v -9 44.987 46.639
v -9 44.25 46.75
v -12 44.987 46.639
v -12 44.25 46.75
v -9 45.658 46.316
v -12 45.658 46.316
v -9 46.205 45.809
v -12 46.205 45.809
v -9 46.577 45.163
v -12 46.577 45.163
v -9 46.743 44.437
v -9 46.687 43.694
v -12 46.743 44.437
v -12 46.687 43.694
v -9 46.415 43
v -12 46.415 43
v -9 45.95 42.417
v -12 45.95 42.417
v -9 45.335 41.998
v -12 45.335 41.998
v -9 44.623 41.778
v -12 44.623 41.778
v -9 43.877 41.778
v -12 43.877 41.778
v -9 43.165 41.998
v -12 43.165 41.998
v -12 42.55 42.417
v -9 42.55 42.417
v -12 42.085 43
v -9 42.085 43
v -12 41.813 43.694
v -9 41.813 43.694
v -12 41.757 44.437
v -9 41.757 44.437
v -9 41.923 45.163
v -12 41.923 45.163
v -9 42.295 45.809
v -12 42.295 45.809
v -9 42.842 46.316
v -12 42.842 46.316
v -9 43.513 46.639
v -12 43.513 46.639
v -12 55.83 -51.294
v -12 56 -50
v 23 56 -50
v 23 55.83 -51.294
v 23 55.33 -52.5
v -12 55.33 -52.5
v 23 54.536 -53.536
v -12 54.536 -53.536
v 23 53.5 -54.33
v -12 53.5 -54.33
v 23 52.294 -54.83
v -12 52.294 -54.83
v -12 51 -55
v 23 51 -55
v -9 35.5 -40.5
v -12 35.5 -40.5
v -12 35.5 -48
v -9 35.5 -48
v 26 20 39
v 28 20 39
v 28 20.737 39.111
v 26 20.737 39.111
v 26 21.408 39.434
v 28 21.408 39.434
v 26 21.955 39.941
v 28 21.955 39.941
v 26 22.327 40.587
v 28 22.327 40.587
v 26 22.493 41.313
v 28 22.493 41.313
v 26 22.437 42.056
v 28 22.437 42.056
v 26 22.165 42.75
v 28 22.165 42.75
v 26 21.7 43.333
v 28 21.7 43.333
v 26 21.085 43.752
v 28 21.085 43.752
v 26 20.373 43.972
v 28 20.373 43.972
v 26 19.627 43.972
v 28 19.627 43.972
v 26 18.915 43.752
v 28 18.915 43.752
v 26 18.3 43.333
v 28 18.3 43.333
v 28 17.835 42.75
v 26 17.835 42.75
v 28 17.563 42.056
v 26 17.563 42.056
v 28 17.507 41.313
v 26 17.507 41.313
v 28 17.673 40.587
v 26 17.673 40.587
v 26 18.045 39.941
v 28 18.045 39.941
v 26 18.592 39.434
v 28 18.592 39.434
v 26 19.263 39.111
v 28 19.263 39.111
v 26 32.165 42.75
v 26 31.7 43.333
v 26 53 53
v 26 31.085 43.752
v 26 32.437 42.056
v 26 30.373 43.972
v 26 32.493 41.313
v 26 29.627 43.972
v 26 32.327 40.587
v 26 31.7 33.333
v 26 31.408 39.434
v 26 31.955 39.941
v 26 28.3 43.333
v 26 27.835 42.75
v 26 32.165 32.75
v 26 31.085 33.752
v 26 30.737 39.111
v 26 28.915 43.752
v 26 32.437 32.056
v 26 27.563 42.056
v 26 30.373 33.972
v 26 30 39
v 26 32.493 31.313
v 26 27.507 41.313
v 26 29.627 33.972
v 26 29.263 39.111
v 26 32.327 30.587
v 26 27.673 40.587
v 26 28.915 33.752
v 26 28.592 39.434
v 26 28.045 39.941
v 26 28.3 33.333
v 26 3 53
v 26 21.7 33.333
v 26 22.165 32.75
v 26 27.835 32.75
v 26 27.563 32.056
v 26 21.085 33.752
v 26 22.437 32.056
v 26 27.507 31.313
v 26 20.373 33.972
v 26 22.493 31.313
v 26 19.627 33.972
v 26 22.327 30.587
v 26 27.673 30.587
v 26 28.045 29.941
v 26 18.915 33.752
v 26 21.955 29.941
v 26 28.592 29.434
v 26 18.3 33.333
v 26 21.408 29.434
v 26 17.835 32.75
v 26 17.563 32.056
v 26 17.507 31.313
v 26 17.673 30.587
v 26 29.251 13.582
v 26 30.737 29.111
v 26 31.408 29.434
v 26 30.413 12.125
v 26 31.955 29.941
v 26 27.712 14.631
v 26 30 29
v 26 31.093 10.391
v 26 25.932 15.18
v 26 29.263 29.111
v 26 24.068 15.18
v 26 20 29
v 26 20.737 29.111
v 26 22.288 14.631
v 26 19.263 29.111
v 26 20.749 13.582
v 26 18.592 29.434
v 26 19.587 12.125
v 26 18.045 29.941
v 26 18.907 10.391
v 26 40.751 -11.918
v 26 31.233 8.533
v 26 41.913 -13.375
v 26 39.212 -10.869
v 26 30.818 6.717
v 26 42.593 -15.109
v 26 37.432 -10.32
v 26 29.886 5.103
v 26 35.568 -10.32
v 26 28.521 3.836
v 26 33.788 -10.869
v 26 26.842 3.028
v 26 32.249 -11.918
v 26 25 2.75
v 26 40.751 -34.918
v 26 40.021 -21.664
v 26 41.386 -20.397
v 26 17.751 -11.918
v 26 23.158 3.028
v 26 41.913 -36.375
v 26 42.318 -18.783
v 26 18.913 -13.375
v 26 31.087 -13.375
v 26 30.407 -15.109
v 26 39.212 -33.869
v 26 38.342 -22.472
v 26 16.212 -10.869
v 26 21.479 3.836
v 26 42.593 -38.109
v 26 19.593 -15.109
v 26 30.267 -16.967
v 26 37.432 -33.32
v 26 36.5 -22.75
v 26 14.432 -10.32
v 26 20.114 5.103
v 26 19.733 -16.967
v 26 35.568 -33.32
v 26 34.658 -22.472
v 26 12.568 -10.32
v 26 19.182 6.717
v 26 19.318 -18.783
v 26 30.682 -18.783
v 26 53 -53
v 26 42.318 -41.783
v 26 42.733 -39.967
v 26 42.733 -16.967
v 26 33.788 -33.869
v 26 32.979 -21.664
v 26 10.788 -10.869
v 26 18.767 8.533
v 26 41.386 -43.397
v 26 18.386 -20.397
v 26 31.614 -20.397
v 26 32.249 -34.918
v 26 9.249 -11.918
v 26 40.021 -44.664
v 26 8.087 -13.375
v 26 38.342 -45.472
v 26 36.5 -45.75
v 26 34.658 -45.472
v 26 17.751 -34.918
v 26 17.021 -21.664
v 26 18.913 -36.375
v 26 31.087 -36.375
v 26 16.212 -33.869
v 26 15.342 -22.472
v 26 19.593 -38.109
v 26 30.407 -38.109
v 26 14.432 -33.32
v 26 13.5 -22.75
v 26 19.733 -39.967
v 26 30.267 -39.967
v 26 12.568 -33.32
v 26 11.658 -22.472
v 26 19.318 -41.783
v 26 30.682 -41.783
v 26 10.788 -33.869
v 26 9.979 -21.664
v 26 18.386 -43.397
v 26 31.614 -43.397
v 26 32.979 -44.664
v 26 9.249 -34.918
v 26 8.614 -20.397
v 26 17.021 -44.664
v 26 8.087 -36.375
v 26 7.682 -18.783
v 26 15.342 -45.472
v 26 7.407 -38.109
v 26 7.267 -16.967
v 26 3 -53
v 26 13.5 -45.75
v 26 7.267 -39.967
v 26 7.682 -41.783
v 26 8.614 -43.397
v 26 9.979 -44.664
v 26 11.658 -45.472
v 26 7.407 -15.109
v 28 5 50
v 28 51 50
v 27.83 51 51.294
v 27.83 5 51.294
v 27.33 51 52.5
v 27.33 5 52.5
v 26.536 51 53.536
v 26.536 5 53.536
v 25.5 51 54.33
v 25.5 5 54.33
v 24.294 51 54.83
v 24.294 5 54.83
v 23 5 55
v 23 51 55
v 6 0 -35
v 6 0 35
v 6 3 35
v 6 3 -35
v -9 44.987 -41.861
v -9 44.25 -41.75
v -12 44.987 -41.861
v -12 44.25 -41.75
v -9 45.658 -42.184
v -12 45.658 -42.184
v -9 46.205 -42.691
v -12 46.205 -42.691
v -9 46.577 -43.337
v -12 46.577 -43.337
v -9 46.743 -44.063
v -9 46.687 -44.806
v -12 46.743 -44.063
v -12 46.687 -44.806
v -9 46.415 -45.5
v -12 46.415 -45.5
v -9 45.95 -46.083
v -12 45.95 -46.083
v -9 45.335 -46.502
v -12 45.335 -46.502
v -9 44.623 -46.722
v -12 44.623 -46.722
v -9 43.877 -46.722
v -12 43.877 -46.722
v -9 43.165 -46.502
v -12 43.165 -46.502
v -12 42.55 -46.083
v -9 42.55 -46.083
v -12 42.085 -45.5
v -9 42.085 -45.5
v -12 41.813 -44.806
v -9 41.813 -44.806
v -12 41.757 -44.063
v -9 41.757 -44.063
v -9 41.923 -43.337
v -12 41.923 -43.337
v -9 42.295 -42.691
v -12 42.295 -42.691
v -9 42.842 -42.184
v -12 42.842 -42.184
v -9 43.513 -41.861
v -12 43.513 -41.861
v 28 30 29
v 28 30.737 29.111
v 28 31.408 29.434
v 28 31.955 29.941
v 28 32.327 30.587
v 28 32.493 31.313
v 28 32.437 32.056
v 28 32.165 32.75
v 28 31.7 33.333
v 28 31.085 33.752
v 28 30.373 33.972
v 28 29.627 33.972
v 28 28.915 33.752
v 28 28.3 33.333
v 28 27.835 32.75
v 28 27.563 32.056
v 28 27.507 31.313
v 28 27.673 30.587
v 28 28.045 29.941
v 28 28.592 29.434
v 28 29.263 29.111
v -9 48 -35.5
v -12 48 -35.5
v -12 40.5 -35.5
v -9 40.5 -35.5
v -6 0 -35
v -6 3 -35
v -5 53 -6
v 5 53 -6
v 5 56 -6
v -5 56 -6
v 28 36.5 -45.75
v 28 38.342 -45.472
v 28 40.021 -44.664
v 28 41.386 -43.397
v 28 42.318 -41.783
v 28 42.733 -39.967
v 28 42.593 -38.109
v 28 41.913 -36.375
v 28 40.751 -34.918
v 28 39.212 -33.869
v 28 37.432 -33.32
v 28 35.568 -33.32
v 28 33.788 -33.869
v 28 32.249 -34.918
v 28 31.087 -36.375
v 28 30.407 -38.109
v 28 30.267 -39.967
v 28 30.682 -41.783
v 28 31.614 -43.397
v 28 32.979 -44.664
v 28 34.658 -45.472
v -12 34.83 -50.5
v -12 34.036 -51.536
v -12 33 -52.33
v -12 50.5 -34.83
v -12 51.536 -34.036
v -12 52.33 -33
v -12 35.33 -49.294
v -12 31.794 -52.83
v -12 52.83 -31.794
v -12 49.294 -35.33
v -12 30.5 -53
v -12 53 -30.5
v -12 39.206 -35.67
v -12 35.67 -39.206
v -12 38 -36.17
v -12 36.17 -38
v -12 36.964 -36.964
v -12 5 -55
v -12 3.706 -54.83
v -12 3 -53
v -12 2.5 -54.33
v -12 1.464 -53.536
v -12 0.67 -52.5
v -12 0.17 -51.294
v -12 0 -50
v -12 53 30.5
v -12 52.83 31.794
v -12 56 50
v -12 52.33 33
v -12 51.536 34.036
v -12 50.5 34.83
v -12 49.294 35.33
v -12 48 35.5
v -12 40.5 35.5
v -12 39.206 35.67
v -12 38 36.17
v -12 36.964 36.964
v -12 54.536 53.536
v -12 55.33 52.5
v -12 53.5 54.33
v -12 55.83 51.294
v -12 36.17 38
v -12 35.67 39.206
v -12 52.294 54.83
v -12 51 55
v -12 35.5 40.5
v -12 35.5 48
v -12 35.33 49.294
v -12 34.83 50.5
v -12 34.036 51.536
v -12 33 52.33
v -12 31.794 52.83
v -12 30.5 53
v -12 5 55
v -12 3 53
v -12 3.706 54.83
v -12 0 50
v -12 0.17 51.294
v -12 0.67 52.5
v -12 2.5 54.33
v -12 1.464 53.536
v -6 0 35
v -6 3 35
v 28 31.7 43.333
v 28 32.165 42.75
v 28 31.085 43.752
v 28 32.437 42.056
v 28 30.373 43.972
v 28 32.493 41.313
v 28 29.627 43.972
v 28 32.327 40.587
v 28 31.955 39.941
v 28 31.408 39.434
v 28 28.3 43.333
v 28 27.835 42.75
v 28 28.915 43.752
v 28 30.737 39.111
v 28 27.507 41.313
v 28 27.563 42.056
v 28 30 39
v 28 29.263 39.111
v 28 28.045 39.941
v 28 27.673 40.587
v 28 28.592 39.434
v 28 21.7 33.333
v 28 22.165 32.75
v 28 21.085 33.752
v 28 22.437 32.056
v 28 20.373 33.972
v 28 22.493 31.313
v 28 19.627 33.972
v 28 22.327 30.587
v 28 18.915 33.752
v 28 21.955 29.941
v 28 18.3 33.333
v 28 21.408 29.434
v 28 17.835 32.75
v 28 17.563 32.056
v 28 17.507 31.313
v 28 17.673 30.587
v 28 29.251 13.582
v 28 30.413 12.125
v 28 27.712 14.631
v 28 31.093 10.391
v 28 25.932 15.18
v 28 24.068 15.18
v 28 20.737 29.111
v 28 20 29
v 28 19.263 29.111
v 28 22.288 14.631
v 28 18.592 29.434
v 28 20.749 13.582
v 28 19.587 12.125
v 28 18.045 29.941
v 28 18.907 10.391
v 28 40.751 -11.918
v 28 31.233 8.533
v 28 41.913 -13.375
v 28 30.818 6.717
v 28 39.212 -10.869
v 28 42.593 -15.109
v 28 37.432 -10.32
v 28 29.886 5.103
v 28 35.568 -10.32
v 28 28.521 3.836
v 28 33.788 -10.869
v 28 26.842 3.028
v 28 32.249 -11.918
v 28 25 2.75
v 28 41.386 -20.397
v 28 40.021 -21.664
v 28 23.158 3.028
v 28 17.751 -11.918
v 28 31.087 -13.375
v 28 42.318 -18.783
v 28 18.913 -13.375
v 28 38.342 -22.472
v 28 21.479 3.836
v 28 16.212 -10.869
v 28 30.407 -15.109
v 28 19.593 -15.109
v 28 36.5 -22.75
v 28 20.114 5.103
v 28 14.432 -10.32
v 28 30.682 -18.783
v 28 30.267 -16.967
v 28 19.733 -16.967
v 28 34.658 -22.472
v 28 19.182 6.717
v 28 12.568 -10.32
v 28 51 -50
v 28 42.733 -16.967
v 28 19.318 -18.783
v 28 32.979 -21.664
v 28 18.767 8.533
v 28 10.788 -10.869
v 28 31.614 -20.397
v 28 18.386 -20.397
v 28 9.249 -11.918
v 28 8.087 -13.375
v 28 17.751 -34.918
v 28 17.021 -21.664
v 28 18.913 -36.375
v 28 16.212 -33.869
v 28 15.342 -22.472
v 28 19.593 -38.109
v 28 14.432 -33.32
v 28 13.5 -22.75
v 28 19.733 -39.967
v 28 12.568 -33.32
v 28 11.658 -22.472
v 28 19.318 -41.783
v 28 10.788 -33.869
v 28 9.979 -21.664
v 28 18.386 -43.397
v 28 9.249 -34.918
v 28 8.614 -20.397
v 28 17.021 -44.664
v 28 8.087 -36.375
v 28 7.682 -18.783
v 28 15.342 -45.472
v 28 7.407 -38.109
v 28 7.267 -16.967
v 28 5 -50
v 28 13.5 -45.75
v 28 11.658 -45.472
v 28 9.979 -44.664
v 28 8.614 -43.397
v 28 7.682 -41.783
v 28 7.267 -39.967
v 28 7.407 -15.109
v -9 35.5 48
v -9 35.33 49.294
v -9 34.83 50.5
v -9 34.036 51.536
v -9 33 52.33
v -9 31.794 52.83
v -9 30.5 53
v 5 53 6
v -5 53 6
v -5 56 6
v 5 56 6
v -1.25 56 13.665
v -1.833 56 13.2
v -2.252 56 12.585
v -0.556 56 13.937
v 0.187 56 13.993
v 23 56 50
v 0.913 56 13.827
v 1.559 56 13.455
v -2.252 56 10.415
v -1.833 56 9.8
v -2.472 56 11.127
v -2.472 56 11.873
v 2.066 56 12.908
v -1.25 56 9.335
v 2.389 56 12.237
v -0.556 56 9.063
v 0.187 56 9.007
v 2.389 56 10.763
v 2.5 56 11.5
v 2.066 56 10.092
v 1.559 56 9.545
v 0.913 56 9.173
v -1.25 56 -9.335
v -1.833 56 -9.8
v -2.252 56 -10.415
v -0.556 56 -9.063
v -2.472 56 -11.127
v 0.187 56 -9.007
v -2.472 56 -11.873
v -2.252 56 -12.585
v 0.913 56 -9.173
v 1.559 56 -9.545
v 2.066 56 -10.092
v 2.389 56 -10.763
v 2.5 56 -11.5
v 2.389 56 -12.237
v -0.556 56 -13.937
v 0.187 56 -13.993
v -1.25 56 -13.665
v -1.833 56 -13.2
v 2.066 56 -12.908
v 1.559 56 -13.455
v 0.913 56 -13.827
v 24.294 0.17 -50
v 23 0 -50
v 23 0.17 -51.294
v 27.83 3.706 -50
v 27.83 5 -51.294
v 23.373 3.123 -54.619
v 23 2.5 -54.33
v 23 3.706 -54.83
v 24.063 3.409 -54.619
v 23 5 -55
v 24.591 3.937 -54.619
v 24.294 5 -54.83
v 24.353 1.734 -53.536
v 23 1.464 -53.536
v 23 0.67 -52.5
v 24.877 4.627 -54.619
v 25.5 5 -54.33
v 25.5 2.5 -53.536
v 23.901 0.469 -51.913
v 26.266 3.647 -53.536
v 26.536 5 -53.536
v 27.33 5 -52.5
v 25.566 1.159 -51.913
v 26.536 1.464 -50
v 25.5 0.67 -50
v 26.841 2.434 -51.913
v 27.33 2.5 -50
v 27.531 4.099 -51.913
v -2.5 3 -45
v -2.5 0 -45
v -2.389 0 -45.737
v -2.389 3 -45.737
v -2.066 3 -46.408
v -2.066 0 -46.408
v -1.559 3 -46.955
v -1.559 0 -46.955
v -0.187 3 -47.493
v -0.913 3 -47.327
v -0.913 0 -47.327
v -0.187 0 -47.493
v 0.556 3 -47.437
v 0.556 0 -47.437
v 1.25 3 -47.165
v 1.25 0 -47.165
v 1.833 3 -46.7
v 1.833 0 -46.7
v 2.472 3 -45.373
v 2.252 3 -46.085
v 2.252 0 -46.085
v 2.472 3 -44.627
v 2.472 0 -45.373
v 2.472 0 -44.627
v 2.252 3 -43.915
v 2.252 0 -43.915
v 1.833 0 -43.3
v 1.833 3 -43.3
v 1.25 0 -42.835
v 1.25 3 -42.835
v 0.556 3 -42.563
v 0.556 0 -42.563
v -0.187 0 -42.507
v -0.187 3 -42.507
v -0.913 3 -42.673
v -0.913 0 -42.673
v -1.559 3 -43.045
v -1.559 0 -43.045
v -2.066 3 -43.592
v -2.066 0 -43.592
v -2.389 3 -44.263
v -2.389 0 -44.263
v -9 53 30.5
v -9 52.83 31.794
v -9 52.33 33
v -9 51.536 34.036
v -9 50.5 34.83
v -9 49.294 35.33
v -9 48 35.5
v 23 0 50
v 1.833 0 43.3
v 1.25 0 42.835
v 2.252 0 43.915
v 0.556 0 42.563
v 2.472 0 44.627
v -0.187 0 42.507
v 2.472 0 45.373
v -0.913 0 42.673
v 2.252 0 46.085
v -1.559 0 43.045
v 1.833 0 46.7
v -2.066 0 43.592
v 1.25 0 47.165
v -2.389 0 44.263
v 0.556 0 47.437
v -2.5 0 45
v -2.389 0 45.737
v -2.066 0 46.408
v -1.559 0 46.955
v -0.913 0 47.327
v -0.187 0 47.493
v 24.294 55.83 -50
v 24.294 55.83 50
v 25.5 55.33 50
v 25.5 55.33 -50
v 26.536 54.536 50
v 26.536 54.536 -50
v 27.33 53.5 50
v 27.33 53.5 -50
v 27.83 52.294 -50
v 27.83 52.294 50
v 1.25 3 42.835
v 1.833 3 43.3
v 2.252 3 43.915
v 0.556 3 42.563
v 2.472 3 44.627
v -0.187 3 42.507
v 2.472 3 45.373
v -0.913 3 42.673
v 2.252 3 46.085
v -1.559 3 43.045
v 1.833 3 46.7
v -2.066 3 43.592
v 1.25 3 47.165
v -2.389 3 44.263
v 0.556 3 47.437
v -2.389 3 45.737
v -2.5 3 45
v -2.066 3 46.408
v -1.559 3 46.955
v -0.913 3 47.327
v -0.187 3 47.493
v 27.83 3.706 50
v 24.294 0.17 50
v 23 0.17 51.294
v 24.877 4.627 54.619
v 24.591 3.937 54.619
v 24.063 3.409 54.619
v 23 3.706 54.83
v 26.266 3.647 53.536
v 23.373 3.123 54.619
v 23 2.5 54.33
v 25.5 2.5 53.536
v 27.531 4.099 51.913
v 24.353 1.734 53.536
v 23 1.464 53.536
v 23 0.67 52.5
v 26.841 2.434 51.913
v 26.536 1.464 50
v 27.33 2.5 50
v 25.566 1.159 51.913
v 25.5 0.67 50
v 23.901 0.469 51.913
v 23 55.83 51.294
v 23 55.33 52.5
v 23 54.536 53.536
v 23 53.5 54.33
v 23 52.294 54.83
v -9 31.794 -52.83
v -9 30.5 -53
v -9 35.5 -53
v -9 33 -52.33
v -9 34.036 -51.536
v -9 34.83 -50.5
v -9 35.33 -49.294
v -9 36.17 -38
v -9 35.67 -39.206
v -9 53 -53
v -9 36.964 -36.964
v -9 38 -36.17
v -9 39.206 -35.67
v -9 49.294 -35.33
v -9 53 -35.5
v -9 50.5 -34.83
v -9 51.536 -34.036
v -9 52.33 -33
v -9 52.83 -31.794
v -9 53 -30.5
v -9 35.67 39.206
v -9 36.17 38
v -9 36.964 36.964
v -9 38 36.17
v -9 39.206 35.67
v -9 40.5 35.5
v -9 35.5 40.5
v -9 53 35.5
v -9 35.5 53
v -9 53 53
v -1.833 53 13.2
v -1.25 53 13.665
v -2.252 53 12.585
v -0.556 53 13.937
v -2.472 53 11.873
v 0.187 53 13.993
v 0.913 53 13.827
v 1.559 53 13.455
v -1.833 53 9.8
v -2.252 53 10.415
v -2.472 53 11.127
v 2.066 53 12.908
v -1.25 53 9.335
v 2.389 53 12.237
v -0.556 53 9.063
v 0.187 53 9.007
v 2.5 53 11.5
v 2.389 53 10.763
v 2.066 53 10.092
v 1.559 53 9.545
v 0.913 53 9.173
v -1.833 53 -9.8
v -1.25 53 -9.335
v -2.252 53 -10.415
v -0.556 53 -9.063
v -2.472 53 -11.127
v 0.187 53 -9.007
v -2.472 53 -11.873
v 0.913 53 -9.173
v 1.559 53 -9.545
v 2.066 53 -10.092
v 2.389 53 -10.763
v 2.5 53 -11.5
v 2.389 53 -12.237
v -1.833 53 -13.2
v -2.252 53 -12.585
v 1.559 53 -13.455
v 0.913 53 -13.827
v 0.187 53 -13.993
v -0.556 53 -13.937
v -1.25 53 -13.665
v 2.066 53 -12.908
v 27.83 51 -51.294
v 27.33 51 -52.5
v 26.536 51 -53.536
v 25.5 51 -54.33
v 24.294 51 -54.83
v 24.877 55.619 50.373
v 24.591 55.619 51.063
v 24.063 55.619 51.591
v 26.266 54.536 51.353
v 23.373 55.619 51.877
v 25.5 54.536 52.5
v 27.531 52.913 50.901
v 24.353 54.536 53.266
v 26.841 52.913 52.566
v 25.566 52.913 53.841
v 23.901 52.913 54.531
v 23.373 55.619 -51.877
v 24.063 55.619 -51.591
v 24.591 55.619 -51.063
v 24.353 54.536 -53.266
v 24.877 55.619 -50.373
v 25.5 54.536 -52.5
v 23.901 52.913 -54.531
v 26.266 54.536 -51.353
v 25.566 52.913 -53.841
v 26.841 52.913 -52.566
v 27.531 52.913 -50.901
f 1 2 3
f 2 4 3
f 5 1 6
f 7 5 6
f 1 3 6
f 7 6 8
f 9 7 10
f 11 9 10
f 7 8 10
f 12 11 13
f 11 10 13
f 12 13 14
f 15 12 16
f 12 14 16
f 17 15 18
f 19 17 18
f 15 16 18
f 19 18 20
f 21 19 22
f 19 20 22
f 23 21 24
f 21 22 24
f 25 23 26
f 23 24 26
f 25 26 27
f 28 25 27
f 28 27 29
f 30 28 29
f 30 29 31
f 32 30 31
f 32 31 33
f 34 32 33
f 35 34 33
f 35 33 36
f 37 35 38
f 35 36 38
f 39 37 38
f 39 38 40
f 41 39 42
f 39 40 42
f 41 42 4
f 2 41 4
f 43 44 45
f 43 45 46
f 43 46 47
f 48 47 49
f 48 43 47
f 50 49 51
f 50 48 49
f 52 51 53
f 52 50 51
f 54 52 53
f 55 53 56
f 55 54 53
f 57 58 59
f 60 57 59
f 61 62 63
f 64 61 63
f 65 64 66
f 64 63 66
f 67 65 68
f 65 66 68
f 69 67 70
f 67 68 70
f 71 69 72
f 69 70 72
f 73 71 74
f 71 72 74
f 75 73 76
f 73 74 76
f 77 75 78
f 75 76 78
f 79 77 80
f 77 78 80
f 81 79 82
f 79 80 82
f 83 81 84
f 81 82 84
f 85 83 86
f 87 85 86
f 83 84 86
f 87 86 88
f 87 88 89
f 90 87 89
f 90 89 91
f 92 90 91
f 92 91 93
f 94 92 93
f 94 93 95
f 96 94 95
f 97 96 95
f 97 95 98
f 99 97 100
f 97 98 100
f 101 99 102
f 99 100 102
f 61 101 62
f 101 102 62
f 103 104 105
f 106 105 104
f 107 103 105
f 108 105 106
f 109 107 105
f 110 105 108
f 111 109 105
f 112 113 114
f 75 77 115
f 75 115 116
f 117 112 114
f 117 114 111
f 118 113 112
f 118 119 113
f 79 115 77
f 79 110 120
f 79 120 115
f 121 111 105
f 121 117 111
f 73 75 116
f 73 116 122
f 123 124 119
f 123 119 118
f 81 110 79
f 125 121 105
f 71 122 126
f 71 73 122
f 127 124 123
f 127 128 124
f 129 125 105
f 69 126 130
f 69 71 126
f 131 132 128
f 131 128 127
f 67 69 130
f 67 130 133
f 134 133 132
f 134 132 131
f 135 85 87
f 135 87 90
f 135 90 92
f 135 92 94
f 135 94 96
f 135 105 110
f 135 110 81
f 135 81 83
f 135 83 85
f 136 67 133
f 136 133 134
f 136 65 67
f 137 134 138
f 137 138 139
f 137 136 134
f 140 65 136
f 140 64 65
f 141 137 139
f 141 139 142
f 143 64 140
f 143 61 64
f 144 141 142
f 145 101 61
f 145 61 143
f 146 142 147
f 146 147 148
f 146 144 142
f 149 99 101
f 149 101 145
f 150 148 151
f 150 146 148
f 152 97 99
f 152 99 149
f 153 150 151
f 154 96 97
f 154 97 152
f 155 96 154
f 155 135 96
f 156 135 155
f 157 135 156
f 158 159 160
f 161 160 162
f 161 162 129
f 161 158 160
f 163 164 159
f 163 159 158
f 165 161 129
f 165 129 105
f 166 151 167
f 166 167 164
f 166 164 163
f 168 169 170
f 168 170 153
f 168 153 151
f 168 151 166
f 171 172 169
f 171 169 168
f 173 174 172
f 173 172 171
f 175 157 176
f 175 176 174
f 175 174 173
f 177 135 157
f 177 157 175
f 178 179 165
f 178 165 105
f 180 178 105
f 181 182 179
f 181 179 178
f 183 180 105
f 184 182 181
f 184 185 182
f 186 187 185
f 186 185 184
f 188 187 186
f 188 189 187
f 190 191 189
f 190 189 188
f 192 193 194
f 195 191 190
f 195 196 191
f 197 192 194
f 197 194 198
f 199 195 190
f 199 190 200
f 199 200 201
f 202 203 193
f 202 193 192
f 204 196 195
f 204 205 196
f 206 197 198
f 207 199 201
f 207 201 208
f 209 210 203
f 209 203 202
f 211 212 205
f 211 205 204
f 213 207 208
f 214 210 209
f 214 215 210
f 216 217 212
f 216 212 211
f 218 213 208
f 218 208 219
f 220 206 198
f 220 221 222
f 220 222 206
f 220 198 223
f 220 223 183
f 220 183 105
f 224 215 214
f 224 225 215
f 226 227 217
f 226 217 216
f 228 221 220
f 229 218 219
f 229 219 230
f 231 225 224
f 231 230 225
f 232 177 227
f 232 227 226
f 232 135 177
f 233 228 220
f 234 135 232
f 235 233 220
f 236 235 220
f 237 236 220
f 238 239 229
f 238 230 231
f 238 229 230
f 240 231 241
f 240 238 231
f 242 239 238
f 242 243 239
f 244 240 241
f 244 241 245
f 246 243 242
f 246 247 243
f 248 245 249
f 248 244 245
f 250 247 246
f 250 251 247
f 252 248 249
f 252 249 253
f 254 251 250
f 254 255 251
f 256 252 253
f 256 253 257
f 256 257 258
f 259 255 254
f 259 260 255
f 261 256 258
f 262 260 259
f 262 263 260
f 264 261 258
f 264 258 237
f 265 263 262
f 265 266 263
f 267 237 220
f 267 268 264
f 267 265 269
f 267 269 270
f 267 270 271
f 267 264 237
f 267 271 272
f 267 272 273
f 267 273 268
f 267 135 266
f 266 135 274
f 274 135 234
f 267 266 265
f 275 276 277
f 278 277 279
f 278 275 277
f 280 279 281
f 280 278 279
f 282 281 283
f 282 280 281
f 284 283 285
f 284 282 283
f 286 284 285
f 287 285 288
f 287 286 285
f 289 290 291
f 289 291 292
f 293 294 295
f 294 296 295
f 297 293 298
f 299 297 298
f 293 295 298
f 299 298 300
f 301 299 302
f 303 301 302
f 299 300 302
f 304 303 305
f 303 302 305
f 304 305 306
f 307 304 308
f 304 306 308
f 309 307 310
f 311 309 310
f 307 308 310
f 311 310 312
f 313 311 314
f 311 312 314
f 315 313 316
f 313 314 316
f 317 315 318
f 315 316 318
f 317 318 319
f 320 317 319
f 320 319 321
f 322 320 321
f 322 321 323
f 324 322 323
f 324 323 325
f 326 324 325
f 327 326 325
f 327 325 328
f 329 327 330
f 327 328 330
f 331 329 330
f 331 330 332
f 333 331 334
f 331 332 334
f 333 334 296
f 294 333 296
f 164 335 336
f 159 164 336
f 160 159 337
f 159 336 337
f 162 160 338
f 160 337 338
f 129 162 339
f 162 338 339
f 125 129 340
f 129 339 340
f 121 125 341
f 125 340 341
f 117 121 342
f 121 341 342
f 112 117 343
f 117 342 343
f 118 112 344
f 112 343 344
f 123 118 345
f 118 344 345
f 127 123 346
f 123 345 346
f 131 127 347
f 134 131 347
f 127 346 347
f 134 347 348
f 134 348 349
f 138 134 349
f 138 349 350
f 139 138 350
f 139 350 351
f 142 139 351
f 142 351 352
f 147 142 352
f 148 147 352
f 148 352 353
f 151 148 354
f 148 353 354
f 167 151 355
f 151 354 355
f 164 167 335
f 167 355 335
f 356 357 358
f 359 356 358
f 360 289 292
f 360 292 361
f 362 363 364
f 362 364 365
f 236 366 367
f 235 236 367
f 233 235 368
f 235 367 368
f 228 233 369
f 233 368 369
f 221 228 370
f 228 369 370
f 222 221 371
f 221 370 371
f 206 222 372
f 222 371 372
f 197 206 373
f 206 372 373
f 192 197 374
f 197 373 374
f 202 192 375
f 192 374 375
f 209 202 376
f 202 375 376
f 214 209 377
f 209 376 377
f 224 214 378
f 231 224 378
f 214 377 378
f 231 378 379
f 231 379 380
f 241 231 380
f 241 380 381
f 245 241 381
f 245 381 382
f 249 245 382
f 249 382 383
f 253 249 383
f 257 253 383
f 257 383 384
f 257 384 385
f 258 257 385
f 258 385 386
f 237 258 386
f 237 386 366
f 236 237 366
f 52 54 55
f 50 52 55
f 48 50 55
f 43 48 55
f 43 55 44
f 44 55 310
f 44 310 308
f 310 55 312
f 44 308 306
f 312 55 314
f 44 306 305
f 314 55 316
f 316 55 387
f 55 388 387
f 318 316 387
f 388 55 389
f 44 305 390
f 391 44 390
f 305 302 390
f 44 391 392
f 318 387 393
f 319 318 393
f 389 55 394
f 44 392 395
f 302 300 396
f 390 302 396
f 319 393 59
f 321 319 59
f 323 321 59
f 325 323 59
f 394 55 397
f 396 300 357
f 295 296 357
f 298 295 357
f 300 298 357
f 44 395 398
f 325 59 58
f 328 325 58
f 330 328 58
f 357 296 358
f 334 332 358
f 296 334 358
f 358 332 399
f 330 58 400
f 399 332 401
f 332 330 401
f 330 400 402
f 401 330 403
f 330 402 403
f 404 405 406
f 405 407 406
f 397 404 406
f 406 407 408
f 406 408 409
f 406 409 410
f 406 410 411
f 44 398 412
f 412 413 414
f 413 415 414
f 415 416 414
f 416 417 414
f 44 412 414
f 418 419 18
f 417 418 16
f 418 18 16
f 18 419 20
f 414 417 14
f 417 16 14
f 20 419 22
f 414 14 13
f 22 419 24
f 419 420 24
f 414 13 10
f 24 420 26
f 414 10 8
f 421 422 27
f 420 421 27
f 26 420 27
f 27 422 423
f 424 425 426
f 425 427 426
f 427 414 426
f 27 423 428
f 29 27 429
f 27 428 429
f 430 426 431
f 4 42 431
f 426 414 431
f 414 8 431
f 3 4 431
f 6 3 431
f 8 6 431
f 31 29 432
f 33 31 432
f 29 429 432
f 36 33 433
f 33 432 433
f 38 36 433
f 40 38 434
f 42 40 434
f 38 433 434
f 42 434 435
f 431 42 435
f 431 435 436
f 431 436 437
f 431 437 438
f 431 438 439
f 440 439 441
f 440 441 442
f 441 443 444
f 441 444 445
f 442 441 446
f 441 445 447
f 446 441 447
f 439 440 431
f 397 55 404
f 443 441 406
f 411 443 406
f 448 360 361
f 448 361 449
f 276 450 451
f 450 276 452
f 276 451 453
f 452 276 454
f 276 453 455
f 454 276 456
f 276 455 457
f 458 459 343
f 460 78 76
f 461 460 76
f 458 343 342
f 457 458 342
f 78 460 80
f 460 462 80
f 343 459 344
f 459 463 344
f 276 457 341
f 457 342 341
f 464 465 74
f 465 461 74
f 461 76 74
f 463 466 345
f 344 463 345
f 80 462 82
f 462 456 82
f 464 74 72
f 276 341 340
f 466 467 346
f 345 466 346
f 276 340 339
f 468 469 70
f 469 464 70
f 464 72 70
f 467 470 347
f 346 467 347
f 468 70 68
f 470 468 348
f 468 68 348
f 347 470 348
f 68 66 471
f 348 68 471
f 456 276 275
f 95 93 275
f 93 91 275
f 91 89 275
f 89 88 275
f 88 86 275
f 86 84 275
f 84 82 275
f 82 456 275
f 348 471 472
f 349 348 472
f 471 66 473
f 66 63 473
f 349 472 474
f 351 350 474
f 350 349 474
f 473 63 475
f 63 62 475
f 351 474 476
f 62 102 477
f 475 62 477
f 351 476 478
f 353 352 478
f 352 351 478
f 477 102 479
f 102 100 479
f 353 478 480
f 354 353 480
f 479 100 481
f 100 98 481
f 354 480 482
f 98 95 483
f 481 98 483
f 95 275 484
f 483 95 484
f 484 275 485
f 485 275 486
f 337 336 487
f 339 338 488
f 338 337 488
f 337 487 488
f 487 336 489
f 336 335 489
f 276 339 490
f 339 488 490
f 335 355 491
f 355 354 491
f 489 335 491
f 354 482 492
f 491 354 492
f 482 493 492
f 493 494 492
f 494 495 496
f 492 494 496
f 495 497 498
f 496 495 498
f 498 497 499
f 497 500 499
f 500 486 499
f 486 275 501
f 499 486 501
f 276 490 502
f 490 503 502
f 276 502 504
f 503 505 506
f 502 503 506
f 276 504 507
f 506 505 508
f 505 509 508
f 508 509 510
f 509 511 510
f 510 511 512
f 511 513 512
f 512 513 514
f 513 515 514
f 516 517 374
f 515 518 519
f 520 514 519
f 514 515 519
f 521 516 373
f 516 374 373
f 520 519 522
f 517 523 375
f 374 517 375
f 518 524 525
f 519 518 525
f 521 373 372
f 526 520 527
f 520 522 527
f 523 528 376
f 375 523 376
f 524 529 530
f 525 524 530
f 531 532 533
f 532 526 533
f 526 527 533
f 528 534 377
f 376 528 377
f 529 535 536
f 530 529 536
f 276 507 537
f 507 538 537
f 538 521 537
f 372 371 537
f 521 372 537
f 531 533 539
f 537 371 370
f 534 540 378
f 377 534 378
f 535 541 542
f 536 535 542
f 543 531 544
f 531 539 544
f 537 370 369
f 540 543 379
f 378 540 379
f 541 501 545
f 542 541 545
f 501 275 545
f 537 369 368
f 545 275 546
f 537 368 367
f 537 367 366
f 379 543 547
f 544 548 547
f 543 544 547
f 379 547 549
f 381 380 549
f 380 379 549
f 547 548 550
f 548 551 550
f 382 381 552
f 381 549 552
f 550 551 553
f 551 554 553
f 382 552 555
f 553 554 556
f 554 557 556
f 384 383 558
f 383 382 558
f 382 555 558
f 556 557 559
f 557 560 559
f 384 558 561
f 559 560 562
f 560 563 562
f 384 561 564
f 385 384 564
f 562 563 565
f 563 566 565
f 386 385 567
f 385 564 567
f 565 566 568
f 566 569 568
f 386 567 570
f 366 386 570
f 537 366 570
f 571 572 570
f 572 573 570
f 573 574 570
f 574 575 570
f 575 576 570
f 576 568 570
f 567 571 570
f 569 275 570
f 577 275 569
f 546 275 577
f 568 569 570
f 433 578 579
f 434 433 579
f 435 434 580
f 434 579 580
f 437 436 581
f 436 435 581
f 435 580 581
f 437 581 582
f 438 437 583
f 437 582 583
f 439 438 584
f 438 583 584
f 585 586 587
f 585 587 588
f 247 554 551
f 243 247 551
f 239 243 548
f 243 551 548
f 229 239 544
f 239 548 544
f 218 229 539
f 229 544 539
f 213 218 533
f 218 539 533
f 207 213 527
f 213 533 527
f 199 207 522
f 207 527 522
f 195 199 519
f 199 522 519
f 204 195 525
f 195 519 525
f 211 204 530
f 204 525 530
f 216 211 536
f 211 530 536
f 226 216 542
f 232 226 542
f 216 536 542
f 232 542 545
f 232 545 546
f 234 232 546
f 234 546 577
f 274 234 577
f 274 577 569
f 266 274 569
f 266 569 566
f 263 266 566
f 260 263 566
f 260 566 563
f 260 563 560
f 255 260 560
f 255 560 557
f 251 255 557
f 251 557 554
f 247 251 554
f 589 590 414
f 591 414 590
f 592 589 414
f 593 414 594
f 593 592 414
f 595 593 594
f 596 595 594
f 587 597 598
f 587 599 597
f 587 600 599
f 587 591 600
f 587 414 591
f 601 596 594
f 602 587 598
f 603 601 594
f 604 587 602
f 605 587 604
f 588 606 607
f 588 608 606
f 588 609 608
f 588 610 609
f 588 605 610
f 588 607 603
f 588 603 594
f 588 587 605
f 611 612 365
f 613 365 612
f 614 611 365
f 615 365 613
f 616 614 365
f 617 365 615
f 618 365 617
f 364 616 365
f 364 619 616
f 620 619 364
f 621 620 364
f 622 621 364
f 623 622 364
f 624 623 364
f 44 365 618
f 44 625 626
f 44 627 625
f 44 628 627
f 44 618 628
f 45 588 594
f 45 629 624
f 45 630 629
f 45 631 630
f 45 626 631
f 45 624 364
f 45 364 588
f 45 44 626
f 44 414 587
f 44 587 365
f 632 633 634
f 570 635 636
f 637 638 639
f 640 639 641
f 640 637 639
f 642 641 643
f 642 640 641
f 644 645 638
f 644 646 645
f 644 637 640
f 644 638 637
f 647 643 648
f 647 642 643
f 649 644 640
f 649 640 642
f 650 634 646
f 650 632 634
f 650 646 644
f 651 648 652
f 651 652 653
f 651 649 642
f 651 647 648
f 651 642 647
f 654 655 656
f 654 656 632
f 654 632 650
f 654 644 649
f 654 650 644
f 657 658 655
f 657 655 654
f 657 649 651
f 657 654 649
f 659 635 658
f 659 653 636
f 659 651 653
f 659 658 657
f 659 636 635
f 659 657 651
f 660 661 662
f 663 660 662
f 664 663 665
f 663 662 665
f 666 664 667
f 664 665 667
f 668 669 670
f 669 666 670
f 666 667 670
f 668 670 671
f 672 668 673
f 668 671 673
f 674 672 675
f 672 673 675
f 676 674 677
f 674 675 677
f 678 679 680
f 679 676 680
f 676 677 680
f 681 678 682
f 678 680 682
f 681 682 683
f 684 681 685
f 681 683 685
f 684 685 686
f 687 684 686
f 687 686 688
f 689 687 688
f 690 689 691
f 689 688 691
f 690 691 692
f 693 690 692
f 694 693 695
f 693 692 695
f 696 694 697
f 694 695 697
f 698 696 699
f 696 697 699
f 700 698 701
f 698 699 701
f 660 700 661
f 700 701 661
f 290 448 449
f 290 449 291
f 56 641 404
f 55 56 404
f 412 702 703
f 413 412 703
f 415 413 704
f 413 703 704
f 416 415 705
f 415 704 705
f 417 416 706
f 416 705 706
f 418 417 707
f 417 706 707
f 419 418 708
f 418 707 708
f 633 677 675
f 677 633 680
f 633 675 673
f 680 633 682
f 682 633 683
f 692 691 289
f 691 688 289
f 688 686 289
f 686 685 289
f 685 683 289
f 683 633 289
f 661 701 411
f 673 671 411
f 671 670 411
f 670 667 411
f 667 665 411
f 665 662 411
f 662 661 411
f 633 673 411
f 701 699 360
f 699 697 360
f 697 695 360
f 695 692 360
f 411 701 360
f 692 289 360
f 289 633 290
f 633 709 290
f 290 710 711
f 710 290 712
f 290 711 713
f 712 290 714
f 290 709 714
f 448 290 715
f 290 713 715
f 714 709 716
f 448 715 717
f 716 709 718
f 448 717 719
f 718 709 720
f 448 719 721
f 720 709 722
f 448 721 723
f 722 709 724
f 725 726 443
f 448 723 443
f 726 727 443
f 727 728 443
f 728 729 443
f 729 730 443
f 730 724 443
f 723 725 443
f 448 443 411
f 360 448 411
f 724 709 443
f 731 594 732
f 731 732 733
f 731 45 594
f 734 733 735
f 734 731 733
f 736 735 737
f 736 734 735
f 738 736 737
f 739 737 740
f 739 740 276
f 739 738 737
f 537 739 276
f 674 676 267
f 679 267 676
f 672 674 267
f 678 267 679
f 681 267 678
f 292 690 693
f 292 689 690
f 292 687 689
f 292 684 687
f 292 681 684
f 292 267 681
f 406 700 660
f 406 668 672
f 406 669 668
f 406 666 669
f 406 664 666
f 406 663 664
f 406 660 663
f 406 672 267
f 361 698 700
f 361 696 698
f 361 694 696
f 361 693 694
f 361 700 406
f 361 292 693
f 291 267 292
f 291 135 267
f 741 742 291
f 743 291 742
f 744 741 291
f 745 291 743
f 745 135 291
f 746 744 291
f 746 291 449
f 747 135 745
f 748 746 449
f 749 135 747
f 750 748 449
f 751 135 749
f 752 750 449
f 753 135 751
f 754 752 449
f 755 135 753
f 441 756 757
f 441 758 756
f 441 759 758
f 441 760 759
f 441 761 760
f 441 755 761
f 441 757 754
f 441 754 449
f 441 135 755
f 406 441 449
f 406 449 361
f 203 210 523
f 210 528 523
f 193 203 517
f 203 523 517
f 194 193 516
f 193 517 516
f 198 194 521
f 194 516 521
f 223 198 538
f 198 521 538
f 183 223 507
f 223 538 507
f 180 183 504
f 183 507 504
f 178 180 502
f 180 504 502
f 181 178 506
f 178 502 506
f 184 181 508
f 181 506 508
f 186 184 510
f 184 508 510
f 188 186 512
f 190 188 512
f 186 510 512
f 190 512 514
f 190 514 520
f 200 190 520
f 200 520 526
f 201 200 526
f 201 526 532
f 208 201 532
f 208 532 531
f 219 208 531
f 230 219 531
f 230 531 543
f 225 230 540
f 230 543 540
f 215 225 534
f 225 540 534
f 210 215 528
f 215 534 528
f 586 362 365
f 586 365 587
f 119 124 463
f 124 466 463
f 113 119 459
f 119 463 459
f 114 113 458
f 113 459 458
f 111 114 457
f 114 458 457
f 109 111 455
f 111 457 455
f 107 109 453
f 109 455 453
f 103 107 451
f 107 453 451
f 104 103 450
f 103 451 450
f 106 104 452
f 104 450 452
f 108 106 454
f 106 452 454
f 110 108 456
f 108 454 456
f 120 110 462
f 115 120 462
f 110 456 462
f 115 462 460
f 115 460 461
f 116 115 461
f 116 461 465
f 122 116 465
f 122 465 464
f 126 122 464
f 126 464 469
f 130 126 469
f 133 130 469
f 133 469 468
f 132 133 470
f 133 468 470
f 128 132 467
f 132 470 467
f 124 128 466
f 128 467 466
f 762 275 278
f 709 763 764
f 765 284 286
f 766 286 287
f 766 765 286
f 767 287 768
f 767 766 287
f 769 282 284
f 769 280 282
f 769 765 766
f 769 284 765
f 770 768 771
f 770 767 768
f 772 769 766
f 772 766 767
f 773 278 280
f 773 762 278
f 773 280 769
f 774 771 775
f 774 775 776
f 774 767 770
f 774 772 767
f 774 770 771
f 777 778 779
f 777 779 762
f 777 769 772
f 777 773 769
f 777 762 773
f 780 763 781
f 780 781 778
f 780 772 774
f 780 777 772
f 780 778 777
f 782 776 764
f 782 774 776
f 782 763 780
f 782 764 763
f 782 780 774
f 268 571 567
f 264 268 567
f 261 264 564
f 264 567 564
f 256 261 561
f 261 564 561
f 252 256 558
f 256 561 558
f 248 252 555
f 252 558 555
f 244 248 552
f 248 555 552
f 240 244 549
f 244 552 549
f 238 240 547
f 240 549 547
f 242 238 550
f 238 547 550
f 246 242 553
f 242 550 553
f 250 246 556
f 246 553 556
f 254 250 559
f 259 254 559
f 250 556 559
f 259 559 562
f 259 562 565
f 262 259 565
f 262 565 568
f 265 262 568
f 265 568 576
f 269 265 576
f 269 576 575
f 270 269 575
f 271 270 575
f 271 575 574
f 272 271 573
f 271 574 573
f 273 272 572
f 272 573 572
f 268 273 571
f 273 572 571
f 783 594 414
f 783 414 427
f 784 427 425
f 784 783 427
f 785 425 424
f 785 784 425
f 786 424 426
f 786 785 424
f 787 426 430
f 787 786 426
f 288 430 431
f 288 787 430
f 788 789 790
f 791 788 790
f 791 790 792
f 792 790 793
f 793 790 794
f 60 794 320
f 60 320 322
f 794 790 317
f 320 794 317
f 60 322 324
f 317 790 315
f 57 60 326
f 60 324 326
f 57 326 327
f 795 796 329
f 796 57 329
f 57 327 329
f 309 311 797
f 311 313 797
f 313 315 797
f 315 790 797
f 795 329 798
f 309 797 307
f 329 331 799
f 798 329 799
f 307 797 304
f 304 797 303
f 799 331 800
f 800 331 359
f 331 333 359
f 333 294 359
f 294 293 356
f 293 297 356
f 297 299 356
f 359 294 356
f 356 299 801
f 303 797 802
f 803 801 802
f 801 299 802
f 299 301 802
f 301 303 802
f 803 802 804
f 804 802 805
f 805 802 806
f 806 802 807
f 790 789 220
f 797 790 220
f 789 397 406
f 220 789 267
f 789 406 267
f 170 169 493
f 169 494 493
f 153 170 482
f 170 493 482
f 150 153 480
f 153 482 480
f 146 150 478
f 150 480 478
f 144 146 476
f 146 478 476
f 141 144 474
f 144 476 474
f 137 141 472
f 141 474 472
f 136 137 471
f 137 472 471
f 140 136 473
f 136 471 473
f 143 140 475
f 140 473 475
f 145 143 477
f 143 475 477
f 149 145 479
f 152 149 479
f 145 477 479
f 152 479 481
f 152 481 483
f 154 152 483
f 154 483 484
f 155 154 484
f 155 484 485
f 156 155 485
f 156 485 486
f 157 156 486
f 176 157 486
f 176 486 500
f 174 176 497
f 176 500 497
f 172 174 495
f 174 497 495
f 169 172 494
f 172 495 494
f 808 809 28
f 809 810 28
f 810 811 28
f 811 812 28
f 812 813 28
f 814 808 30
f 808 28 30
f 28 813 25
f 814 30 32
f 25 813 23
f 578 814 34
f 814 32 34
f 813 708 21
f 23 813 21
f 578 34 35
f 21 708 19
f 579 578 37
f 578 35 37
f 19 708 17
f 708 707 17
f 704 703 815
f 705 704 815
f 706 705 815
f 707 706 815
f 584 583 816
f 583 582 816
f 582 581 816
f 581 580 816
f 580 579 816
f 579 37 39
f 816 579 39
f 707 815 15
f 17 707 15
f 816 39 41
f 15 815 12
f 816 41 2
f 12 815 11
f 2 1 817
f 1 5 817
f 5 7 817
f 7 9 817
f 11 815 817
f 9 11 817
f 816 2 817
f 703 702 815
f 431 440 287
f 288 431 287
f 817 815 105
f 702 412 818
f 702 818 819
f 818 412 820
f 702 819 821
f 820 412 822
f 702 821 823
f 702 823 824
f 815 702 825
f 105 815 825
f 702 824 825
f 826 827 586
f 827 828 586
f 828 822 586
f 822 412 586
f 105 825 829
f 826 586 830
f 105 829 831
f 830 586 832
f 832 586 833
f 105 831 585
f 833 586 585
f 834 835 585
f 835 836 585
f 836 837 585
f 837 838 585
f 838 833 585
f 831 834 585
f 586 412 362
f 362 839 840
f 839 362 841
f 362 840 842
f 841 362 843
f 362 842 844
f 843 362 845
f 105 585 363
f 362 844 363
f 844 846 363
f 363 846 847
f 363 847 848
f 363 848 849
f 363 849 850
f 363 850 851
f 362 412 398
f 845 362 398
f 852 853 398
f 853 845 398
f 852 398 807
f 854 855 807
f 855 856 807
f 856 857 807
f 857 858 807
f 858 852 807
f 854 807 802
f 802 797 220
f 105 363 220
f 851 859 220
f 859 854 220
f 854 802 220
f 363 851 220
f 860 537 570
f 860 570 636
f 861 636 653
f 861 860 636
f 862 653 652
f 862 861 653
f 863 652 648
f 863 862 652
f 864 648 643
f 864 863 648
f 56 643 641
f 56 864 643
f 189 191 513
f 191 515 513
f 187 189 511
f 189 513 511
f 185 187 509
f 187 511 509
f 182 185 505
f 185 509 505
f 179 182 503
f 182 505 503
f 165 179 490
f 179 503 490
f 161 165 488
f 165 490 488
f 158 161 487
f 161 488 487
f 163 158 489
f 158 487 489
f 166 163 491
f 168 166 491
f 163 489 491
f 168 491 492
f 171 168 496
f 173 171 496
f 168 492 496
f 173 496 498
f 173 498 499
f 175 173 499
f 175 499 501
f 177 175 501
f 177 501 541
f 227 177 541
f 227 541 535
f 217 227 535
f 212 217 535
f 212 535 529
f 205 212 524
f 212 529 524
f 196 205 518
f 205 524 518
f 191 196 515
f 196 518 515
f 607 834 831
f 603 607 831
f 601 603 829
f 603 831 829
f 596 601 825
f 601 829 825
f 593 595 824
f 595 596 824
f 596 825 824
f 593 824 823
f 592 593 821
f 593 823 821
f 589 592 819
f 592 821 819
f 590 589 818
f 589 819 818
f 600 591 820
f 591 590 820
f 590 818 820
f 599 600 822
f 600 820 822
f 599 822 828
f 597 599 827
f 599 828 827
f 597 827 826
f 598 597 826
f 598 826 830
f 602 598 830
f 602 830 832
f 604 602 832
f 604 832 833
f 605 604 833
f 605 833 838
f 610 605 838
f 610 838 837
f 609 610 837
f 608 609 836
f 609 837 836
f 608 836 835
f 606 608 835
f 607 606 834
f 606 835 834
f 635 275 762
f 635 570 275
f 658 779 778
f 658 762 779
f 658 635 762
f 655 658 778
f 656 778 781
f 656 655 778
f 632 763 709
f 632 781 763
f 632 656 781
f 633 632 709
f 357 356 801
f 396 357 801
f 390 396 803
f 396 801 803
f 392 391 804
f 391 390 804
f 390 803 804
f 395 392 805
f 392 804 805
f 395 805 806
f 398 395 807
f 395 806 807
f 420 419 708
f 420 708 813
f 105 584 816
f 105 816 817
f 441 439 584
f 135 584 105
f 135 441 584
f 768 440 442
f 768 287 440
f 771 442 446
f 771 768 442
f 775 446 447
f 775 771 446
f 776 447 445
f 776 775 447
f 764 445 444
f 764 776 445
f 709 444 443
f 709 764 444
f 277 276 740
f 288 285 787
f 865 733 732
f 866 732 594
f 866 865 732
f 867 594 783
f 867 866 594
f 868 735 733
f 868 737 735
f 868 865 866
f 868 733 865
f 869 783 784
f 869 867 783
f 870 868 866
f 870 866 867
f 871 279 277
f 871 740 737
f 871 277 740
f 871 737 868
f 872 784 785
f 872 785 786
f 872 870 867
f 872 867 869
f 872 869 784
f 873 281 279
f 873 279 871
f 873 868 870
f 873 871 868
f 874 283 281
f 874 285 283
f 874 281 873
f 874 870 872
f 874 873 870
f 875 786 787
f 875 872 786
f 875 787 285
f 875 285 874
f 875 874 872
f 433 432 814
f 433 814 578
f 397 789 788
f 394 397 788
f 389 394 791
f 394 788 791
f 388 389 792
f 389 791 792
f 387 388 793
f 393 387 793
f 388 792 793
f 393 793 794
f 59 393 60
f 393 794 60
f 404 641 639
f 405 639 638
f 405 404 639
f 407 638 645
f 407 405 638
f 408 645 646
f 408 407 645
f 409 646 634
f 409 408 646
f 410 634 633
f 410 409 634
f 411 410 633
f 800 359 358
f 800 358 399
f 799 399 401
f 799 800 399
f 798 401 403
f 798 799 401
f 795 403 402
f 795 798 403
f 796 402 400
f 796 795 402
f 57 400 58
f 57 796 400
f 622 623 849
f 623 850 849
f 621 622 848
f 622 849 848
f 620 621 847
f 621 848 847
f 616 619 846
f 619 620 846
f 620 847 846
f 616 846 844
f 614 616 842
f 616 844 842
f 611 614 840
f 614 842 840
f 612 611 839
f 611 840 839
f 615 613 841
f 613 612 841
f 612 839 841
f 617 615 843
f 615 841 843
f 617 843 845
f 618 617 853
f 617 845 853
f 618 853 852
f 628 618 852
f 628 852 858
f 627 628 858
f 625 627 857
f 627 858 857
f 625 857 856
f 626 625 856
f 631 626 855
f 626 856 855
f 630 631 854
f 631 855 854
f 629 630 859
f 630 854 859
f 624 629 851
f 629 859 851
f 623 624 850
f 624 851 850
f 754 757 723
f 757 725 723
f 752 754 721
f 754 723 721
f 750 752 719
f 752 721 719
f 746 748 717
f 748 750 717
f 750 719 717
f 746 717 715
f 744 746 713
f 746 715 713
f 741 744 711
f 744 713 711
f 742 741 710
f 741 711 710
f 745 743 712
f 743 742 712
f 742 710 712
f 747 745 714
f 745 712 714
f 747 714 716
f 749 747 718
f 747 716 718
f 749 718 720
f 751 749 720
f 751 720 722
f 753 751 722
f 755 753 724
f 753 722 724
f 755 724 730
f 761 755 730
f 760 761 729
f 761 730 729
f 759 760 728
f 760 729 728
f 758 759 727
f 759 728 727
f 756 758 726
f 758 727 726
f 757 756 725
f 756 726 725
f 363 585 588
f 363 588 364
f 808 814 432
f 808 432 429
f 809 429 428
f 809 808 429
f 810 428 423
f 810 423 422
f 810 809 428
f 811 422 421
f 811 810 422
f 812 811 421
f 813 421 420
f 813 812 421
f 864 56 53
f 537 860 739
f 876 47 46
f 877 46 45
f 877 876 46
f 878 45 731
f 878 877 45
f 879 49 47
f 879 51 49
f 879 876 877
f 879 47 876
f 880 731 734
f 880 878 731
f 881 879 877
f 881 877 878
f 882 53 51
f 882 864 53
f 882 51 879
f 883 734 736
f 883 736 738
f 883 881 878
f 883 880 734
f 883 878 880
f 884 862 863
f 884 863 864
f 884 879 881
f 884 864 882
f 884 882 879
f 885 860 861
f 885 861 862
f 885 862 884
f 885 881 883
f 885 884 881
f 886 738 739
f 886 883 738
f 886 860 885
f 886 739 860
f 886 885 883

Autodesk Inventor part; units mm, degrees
ref_plane "YZ Plane" through (0, 0, 0) normal (1, 0, 0) x (0, 1, 0)
ref_plane "XZ Plane" through (0, 0, 0) normal (0, 1, 0) x (-1, 0, 0)
ref_plane "XY Plane" through (0, 0, 0) normal (0, 0, 1) x (1, 0, 0)
sketch "Sketch1" plane through (0, 0, 0) normal (0, 1, 0) x (-1, 0, 0)
  circle A0 centre (0, 45) radius 2.5
  circle A1 centre (0, -45) radius 2.5
  line L0 (12, 55) -> (-28, 55)
  line L1 (-28, 55) -> (-28, -55)
  line L2 (-28, -55) -> (12, -55)
  line L3 (12, -55) -> (12, 55)
  line L4 (-6, -35) -> (6, -35)
  line L5 (6, -35) -> (6, 35)
  line L6 (6, 35) -> (-6, 35)
  line L7 (-6, 35) -> (-6, -35)
  point P0 (0, 0)
  point P1 (0, -35)
  point P2 (0, 35)
  dimension "d0" = 5
  dimension "d1" = 5
  dimension "d2" = 90
  dimension "d3" = 45
  dimension "d4" = 40
  dimension "d6" = 110
  dimension "d7" = 55
  dimension "d36" = 70
  dimension "d37" = 12
  dimension "d38" = 35
  dimension "d39" = 0
  dimension "d40" = 28
  dimension "d42" = 0
  dimension "d52" = 0
extrude "Extrusion1" add sketch "Sketch1" along normal blind 3
sketch "Sketch2" plane through (0, 3, 0) normal (0, 1, 0) x (1, 0, 0)
  line L0 (-12, -55) -> (28, -55) projected
  line L1 (-12, 55) -> (-12, -55) projected
  line L2 (28, -55) -> (-12, -55)
  line L3 (-12, -55) -> (-12, -53)
  line L4 (-12, -53) -> (28, -53)
  line L5 (28, -53) -> (28, -55)
  line L6 (28, 55) -> (-12, 55) projected
  line L7 (28, -55) -> (26, -55)
  line L8 (26, -55) -> (26, 55)
  line L9 (26, 55) -> (28, 55)
  line L10 (28, 55) -> (28, -55)
  line L11 (28, 55) -> (-12, 55)
  line L12 (-12, 55) -> (-12, 53)
  line L13 (-12, 53) -> (28, 53)
  line L14 (28, 53) -> (28, 55)
  point P0 (0, 0)
  point P1 (-12, 53)
  point P2 (26, 53)
  point P3 (26, -53)
  dimension "d10" = 2
  dimension "d11" = 2
  dimension "d12" = 2
extrude "Extrusion2" add sketch "Sketch2" along normal blind 50 contours L1 L4 L8 L0 | L8 L4 L5 L0 | L8 L13 L10 L4 | L1 L6 L8 L13 | L8 L6 L10 L13
sketch "Sketch3" plane through (28, 0, 55) normal (1, 0, 0) x (0, 0, -1)
  line L0 (94.5, 13.5) -> (71.5, 13.5)
  line L1 (71.5, 13.5) -> (71.5, 36.5)
  line L2 (71.5, 36.5) -> (94.5, 36.5)
  line L3 (94.5, 36.5) -> (94.5, 13.5)
  line L4 (94.5, 13.5) -> (71.5, 36.5) construction
  line L5 (71.5, 13.5) -> (94.5, 36.5) construction
  circle A0 centre (94.5, 13.5) radius 6.25
  circle A1 centre (71.5, 13.5) radius 6.25
  circle A2 centre (94.5, 36.5) radius 6.25
  circle A3 centre (71.5, 36.5) radius 6.25
  line L6 (23.5, 20) -> (13.5, 20)
  line L7 (13.5, 20) -> (13.5, 30)
  line L8 (13.5, 30) -> (23.5, 30)
  line L9 (23.5, 30) -> (23.5, 20)
  line L10 (23.5, 20) -> (13.5, 30) construction
  line L11 (13.5, 20) -> (23.5, 30) construction
  circle A4 centre (23.5, 20) radius 2.5
  circle A5 centre (13.5, 20) radius 2.5
  circle A6 centre (13.5, 30) radius 2.5
  circle A7 centre (23.5, 30) radius 2.5
  circle A8 centre (46, 25) radius 6.25
  line L12 (0, 0) -> (110, 0) projected
  line L13 (110, 0) -> (110, 53) projected
  point P0 (55, 0)
  point P1 (83, 25)
  point P2 (18.5, 25)
  dimension "d15" = 23
  dimension "d16" = 23
  dimension "d17" = 12.5
  dimension "d18" = 12.5
  dimension "d19" = 12.5
  dimension "d20" = 12.5
  dimension "d21" = 10
  dimension "d22" = 10
  dimension "d23" = 5
  dimension "d24" = 5
  dimension "d25" = 5
  dimension "d26" = 5
  dimension "d27" = 12.5
  dimension "d28" = 25
  dimension "d29" = 25
  dimension "d30" = 25
  dimension "d31" = 27
  dimension "d32" = 37
  dimension "d33" = 27.5
extrude "Extrusion3" cut sketch "Sketch3" against normal through all contours A1 L1 L0 | L0 L1 A1 | A0 L3 L0 | L0 L3 A0 | A3 L2 L1 | L1 L2 A3 | A2 L2 L3 | L3 L2 A2 | A5 L7 L6 | L6 L7 A5 | A4 L9 L6 | L6 L9 A4 | A6 L8 L7 | L7 L8 A6 | A7 L8 L9 | L9 L8 A7 | A8
sketch "Sketch4" plane through (0, 53, 0) normal (0, 1, 0) x (1, 0, 0)
  line L0 (28, 55) -> (-12, 55) projected
  line L1 (28, 55) -> (-12, 55)
  line L2 (-12, 55) -> (-12, -55)
  line L3 (-12, -55) -> (28, -55)
  line L4 (28, -55) -> (28, 55)
  line L5 (5, 6) -> (-5, 6)
  line L6 (-5, 6) -> (-5, -6)
  line L7 (-5, -6) -> (5, -6)
  line L8 (5, -6) -> (5, 6)
  line L9 (5, 6) -> (-5, -6) construction
  line L10 (-5, 6) -> (5, -6) construction
  circle A0 centre (0, 11.5) radius 2.5
  circle A1 centre (0, -11.5) radius 2.5
  point P0 (0, 0)
  dimension "d43" = 10
  dimension "d44" = 12
  dimension "d45" = 5
  dimension "d46" = 5
  dimension "d47" = 23
  dimension "d48" = 11.5
extrude "Extrusion4" add sketch "Sketch4" along normal blind 3
fillet "Fillet1" radius 5 8 edges at (28, 0, 0) (28, 28, -55) (8, 0, -55) (8, 0, 55) (28, 28, 55) (28, 56, 0) (8, 56, -55) (8, 56, 55)
sketch "Sketch5" plane through (-12, 0, -50) normal (-1, 0, 0) x (0, 0, 1)
  line L0 (-3, 53) -> (103, 53) projected
  line L1 (103, 53) -> (85.5, 53)
  line L2 (85.5, 53) -> (85.5, 35.5)
  line L3 (85.5, 35.5) -> (103, 35.5)
  line L4 (103, 35.5) -> (103, 53)
  line L5 (-3, 53) -> (14.5, 53)
  line L6 (14.5, 53) -> (14.5, 35.5)
  line L7 (14.5, 35.5) -> (-3, 35.5)
  line L8 (-3, 35.5) -> (-3, 53)
  circle A0 centre (94.25, 44.25) radius 2.5
  circle A1 centre (5.75, 44.25) radius 2.5
  point P0 (50, 0)
  point P1 (14.5, 53)
  dimension "d54" = 17.5
  dimension "d55" = 17.5
  dimension "d56" = 17.5
  dimension "d57" = 17.5
  dimension "d58" = 5
  dimension "d59" = 5
  dimension "d60" = 8.75
  dimension "d61" = 8.75
  dimension "d62" = 8.75
  dimension "d63" = 8.75
extrude "Extrusion5" add sketch "Sketch5" against normal blind 3
fillet "Fillet2" radius 5 6 edges at (-10.5, 35.5, 53) (-10.5, 35.5, 35.5) (-10.5, 53, 35.5) (-10.5, 53, -35.5) (-10.5, 35.5, -35.5) (-10.5, 35.5, -53)
properties part number "electro_hold"
